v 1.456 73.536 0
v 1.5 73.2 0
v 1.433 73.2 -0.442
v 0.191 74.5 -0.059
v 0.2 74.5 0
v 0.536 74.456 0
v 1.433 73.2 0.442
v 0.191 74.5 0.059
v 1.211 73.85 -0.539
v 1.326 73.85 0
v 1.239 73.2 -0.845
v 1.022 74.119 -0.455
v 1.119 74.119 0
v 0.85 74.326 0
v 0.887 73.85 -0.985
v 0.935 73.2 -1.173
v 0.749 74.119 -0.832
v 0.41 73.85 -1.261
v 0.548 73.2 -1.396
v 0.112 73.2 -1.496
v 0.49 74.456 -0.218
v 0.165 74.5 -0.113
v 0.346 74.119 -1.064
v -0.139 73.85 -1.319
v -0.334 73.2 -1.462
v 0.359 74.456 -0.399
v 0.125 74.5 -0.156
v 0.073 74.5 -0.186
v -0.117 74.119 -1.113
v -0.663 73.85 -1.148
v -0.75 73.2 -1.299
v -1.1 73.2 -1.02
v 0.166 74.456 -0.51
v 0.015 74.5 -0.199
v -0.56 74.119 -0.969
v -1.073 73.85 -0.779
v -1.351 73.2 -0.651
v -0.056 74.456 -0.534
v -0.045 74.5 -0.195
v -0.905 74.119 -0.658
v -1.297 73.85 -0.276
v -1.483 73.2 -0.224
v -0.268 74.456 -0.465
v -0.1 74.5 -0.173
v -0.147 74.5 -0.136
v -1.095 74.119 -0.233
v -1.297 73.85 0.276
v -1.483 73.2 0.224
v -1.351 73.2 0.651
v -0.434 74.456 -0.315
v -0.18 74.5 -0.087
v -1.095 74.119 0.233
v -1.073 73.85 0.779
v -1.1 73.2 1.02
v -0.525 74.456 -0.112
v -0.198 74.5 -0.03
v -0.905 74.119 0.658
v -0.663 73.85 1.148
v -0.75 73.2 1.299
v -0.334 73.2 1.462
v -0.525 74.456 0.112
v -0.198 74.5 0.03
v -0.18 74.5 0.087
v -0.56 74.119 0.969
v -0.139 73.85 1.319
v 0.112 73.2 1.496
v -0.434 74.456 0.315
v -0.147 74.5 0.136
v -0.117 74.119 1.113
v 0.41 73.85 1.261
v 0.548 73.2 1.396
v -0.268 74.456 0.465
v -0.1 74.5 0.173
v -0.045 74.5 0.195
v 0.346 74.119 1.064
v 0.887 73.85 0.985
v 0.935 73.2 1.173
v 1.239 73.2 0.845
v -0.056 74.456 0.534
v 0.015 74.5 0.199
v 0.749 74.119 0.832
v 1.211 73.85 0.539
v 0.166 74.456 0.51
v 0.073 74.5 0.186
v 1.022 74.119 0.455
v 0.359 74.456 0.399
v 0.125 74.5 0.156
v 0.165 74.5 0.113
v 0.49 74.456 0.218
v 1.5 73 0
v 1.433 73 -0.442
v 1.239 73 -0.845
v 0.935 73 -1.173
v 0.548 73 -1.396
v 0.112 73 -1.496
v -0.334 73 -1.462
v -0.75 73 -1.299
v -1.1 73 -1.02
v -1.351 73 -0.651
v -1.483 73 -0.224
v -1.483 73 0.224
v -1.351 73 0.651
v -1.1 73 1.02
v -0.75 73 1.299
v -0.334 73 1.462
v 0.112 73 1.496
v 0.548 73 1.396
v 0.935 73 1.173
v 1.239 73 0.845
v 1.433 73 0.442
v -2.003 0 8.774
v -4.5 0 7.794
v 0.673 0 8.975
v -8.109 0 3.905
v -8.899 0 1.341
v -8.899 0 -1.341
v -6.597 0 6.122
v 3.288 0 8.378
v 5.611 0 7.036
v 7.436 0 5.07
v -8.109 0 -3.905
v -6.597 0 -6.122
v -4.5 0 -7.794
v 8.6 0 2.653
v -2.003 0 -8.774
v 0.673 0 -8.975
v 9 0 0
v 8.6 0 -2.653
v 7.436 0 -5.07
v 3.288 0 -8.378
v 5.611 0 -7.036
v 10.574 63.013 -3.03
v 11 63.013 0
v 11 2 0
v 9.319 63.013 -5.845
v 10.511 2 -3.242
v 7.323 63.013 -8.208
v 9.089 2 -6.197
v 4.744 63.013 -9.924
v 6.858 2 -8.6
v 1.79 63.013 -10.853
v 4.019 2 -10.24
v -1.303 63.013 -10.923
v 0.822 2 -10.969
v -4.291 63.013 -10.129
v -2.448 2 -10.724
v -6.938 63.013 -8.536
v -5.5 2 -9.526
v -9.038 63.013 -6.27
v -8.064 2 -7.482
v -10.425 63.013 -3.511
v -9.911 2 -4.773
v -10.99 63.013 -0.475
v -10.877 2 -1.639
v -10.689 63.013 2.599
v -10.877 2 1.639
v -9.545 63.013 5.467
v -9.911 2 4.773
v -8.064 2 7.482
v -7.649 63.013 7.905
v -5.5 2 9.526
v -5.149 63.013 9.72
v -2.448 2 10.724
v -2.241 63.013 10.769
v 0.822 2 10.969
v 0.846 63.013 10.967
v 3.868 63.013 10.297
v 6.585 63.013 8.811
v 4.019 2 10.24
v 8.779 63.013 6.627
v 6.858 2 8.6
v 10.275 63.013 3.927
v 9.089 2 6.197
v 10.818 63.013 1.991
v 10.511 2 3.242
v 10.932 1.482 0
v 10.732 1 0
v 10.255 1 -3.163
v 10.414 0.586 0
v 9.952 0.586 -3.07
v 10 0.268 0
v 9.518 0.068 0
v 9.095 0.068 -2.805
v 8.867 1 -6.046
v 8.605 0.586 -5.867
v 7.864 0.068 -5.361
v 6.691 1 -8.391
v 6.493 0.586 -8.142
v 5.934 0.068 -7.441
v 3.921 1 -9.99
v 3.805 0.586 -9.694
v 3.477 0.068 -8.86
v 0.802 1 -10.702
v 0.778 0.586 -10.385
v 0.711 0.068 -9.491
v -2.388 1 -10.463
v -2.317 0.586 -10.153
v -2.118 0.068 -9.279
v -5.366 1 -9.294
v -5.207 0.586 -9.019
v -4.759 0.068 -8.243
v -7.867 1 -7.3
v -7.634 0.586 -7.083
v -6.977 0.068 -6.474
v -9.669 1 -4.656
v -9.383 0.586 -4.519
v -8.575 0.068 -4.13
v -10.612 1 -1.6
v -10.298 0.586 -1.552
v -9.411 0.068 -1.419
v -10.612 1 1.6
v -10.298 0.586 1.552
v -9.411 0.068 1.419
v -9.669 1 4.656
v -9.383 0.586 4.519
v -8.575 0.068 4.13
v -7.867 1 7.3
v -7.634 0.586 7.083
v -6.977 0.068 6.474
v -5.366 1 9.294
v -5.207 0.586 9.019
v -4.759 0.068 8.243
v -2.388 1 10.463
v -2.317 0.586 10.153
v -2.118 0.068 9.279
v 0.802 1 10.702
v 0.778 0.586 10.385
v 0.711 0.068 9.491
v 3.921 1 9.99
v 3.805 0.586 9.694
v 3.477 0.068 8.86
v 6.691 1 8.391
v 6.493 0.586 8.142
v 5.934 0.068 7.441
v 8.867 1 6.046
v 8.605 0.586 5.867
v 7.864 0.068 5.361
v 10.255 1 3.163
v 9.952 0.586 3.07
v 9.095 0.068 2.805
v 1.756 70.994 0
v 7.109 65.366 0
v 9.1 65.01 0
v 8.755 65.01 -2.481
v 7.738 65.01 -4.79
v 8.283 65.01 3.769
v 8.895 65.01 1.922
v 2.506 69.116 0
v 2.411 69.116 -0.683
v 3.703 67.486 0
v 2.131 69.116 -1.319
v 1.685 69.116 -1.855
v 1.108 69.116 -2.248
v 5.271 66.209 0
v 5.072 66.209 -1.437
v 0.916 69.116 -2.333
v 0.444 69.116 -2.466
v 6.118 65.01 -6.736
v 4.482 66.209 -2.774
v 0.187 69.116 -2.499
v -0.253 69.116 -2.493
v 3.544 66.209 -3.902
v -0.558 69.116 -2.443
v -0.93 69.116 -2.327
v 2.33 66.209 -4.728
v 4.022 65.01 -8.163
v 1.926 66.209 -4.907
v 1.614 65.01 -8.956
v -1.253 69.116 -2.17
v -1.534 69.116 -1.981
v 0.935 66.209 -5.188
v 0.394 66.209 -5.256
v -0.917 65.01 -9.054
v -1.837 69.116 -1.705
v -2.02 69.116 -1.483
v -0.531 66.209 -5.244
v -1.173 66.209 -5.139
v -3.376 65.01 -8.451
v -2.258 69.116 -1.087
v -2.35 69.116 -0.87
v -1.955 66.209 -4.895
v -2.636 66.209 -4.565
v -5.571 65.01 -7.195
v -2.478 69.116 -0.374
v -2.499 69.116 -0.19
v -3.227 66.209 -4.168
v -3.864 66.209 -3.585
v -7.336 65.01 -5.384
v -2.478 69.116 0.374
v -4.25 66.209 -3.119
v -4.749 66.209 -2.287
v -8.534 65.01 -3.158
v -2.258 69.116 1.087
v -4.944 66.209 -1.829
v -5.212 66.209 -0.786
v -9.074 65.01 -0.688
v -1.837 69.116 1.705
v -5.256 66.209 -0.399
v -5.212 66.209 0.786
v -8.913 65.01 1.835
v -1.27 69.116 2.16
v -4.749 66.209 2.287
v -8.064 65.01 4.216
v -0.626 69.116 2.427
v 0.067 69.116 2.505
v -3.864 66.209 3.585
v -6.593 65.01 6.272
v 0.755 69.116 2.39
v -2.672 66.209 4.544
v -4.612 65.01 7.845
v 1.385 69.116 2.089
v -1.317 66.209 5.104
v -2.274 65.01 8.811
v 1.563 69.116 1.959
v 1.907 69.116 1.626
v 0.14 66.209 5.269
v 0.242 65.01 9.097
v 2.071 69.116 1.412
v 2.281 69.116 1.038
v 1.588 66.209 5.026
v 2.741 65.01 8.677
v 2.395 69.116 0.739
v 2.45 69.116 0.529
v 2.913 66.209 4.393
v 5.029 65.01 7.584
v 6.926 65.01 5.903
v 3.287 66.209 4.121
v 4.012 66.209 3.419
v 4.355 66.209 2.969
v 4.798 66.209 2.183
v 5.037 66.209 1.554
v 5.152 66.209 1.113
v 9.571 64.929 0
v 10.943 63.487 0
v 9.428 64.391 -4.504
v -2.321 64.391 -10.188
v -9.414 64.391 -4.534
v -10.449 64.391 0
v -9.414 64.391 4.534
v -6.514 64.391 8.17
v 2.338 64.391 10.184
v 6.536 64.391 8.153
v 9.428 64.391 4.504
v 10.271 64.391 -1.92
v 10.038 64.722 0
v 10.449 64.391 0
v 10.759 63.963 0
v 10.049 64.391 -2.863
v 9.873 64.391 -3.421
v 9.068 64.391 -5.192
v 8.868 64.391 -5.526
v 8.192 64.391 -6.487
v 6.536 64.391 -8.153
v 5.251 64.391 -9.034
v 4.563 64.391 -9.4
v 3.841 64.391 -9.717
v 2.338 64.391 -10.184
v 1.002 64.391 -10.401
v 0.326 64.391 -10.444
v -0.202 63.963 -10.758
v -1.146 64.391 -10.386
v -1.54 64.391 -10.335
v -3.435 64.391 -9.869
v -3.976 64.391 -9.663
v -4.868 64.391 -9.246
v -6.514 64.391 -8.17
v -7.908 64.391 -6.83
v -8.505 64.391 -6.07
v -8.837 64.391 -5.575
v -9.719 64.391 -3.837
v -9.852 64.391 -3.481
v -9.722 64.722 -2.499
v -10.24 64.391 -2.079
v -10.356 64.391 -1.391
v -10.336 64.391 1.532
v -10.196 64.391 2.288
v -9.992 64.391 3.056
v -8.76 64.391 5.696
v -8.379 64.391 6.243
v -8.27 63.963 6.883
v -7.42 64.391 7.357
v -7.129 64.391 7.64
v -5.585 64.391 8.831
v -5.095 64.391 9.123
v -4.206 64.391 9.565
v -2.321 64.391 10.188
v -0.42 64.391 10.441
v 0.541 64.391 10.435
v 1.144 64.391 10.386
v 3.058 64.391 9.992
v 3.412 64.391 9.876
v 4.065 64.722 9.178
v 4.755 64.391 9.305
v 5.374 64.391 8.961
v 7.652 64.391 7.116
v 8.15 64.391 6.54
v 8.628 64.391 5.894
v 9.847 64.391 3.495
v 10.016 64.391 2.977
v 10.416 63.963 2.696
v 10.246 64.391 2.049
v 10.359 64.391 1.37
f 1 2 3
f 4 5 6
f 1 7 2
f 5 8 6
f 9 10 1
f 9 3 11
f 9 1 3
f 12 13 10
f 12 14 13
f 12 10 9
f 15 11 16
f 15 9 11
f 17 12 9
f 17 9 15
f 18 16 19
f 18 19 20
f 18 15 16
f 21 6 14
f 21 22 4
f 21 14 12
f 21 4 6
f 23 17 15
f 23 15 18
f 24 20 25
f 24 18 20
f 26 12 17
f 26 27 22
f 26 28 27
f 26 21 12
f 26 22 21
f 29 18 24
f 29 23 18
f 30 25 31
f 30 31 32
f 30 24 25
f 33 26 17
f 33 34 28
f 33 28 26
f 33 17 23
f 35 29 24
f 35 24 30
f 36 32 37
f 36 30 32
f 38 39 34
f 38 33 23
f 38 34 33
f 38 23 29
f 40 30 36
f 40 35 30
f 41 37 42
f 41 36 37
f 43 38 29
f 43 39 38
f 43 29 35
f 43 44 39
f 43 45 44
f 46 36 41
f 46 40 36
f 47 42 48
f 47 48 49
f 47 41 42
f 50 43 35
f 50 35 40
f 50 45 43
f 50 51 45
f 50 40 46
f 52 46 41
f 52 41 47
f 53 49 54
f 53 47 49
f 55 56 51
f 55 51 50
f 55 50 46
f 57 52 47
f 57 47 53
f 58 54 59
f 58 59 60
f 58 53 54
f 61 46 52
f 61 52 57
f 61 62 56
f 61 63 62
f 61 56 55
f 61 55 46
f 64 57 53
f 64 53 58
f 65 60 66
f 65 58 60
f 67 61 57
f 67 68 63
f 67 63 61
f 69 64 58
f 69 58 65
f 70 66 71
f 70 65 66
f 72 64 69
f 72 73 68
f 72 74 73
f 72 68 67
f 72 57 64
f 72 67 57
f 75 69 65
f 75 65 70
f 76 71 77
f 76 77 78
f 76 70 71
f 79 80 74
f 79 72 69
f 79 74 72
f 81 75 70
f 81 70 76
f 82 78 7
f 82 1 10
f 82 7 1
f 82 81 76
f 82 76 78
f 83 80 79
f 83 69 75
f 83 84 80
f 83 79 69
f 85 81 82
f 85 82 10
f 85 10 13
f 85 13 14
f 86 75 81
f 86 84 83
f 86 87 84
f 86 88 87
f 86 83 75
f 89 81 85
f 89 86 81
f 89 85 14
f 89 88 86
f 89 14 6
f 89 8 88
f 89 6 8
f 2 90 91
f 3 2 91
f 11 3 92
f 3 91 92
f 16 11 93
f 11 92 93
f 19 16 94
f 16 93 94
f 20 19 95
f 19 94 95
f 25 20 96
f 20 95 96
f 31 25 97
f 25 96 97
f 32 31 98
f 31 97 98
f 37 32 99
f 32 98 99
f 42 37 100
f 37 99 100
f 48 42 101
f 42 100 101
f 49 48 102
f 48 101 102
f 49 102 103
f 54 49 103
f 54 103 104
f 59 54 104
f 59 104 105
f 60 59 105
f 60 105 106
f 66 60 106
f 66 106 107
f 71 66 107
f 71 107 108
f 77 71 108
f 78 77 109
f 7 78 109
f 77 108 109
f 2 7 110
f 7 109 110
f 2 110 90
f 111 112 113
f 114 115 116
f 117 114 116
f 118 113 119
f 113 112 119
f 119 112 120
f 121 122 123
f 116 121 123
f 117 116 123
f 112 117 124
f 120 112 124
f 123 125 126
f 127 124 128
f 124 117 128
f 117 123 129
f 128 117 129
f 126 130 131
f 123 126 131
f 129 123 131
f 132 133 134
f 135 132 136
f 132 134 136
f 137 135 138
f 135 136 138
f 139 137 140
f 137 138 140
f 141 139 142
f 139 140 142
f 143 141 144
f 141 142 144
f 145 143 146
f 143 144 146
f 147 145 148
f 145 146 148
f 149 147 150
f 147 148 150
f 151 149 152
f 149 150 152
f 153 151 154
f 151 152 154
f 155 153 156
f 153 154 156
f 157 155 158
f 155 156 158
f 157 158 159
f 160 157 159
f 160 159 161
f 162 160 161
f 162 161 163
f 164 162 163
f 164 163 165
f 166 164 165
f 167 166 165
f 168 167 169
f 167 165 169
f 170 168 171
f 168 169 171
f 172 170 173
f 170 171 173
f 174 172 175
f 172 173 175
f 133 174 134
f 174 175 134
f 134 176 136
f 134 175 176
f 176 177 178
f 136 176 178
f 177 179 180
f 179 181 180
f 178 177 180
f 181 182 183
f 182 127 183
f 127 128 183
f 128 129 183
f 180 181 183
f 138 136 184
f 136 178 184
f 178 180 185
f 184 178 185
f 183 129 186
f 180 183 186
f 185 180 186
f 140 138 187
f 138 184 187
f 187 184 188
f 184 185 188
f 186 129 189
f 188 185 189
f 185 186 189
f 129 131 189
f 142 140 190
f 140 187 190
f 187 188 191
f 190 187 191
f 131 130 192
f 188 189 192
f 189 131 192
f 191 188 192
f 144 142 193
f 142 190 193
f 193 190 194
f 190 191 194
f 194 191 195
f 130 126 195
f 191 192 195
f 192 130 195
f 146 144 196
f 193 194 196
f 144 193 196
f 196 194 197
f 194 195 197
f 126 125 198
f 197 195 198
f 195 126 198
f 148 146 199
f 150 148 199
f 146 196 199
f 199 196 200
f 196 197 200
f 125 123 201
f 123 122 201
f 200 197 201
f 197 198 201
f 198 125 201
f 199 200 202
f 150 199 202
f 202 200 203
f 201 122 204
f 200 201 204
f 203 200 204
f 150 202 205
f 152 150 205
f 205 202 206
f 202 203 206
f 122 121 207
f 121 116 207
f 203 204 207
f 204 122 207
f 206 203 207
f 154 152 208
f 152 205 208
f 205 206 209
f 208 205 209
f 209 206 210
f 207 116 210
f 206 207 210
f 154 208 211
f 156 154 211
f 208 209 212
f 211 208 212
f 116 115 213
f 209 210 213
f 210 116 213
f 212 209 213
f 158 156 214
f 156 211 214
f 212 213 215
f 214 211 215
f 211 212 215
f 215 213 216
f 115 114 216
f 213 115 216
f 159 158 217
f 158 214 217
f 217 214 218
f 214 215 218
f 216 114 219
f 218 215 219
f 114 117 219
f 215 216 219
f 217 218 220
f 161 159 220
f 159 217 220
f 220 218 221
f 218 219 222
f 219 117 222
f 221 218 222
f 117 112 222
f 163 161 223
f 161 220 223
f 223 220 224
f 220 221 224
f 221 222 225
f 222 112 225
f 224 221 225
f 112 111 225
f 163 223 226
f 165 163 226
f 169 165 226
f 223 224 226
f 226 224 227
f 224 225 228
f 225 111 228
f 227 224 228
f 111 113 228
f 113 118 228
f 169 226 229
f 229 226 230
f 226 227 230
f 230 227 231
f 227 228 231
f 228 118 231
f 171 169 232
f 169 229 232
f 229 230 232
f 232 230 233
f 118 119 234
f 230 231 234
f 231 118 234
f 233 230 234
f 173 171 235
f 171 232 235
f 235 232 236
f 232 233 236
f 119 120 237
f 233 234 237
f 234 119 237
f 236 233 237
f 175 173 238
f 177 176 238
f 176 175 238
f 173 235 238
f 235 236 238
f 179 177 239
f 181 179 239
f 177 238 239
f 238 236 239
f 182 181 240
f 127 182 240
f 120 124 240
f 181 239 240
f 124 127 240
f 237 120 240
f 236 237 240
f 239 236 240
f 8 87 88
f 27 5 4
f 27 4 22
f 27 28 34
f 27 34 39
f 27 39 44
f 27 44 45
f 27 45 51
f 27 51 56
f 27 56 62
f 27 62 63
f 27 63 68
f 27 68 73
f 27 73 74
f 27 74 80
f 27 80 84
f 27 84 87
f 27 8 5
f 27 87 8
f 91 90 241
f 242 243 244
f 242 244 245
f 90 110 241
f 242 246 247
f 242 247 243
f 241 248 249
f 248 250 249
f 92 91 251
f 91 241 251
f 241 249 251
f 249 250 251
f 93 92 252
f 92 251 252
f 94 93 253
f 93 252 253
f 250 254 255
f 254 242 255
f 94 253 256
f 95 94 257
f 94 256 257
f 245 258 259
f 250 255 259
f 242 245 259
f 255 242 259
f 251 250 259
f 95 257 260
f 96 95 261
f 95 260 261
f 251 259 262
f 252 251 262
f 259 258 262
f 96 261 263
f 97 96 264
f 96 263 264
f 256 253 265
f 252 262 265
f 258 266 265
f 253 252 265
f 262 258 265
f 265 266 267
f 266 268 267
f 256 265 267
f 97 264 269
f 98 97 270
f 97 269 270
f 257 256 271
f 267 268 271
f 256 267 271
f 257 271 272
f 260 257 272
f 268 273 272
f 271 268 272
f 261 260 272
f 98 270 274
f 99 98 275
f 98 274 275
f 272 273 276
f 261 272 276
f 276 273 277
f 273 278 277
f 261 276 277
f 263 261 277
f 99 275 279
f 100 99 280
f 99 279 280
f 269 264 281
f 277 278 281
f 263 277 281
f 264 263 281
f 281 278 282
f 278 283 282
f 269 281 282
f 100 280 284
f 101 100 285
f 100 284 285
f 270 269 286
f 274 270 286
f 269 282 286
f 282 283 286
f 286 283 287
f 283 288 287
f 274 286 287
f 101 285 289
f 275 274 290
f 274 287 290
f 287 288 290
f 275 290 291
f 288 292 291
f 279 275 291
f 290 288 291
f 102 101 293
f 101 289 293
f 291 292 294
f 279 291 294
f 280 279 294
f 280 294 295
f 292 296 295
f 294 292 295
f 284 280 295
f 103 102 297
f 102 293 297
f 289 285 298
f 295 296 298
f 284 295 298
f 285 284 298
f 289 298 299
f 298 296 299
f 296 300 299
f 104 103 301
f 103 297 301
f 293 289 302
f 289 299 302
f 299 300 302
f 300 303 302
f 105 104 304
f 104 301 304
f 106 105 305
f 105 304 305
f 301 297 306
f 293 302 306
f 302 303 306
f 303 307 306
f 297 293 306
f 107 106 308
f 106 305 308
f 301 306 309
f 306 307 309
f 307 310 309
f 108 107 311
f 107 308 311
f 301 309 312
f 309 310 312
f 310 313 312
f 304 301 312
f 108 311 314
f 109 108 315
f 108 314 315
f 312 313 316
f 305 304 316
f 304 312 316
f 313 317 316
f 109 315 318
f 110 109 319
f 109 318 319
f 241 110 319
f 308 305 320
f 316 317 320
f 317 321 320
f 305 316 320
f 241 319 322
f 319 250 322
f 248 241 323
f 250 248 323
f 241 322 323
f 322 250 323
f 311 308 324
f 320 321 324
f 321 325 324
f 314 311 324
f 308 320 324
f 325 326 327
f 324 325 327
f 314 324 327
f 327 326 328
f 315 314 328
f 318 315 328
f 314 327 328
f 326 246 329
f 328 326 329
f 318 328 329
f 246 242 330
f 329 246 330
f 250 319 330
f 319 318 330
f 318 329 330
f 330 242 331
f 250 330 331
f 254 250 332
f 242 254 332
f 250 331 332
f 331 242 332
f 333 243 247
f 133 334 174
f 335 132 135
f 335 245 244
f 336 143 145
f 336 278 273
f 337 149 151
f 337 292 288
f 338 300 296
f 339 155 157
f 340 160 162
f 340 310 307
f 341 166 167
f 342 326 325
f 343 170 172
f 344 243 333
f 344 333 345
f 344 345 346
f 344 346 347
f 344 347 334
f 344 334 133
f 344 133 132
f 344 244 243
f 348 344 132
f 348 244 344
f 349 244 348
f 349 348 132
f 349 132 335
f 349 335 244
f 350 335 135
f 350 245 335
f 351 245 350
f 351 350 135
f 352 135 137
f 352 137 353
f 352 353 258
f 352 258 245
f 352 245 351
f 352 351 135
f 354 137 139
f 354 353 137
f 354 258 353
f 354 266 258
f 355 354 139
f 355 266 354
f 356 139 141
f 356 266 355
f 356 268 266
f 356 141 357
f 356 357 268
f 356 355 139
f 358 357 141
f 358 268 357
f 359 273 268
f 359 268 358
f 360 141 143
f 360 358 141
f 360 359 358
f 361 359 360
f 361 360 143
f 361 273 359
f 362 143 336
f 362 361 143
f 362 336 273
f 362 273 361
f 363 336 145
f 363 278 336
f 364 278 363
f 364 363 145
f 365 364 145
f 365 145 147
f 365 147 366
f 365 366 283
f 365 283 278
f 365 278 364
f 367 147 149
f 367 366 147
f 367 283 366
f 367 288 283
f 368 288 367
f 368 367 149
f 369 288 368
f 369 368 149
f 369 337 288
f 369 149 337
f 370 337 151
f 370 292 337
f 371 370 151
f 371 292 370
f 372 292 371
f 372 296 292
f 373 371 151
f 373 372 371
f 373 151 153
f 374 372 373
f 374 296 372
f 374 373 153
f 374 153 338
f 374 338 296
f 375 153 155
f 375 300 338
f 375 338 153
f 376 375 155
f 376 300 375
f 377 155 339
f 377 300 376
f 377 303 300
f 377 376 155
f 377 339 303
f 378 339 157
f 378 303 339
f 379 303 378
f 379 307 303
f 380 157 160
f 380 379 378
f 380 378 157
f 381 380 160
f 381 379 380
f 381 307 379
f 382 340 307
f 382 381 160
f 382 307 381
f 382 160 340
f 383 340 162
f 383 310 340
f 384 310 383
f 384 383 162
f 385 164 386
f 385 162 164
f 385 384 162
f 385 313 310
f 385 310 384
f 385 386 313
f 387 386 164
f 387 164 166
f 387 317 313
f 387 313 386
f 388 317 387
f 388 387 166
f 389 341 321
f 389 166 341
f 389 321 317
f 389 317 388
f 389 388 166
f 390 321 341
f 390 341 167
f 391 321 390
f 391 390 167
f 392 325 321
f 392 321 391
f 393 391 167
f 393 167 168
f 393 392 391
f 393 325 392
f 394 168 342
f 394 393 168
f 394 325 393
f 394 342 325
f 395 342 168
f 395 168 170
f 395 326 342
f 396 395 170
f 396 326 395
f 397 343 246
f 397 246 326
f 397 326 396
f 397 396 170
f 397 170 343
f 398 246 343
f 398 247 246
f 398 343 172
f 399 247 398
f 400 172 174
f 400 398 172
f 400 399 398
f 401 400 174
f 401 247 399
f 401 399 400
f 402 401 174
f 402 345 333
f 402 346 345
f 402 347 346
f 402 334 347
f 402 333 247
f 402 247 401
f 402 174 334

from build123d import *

# Parameters (mm, degrees)
SKETCH1_R           = 11
BOSS_EXTRUDE1_DEPTH = 65
SKETCH2_R           = 1.5
BOSS_EXTRUDE2_DEPTH = 9.5
FILLET1_R           = 1.3
FILLET2_R           = 8
FILLET3_R           = 2
FILLET4_R           = 2


with BuildPart() as part:
    # Sketch1 → Boss-Extrude1 (new body)
    with BuildSketch(Plane(origin=(0, 0, 0), x_dir=(1, 0, 0), z_dir=(0, 1, 0))):
        Circle(SKETCH1_R)
    extrude(amount=BOSS_EXTRUDE1_DEPTH)

    # Sketch2 → Boss-Extrude2 (add)
    with BuildSketch(Plane(origin=(0, 65, 0), x_dir=(1, 0, 0), z_dir=(0, 1, 0))):
        Circle(SKETCH2_R)
    extrude(amount=BOSS_EXTRUDE2_DEPTH)

    # Fillet1
    fillet1_edges = [part.edges().sort_by_distance(p)[0] for p in [
        (-1.5, 74.5, 0),
    ]]
    fillet(fillet1_edges, radius=FILLET1_R)

    # Fillet2
    fillet2_edges = [part.edges().sort_by_distance(p)[0] for p in [
        (-1.5, 65, 0),
    ]]
    fillet(fillet2_edges, radius=FILLET2_R)

    # Fillet3
    fillet3_edges = [part.edges().sort_by_distance(p)[0] for p in [
        (-11, 65, 0),
    ]]
    fillet(fillet3_edges, radius=FILLET3_R)

    # Fillet4
    fillet4_edges = [part.edges().sort_by_distance(p)[0] for p in [
        (-11, 0, 0),
    ]]
    fillet(fillet4_edges, radius=FILLET4_R)


solid = part.part
